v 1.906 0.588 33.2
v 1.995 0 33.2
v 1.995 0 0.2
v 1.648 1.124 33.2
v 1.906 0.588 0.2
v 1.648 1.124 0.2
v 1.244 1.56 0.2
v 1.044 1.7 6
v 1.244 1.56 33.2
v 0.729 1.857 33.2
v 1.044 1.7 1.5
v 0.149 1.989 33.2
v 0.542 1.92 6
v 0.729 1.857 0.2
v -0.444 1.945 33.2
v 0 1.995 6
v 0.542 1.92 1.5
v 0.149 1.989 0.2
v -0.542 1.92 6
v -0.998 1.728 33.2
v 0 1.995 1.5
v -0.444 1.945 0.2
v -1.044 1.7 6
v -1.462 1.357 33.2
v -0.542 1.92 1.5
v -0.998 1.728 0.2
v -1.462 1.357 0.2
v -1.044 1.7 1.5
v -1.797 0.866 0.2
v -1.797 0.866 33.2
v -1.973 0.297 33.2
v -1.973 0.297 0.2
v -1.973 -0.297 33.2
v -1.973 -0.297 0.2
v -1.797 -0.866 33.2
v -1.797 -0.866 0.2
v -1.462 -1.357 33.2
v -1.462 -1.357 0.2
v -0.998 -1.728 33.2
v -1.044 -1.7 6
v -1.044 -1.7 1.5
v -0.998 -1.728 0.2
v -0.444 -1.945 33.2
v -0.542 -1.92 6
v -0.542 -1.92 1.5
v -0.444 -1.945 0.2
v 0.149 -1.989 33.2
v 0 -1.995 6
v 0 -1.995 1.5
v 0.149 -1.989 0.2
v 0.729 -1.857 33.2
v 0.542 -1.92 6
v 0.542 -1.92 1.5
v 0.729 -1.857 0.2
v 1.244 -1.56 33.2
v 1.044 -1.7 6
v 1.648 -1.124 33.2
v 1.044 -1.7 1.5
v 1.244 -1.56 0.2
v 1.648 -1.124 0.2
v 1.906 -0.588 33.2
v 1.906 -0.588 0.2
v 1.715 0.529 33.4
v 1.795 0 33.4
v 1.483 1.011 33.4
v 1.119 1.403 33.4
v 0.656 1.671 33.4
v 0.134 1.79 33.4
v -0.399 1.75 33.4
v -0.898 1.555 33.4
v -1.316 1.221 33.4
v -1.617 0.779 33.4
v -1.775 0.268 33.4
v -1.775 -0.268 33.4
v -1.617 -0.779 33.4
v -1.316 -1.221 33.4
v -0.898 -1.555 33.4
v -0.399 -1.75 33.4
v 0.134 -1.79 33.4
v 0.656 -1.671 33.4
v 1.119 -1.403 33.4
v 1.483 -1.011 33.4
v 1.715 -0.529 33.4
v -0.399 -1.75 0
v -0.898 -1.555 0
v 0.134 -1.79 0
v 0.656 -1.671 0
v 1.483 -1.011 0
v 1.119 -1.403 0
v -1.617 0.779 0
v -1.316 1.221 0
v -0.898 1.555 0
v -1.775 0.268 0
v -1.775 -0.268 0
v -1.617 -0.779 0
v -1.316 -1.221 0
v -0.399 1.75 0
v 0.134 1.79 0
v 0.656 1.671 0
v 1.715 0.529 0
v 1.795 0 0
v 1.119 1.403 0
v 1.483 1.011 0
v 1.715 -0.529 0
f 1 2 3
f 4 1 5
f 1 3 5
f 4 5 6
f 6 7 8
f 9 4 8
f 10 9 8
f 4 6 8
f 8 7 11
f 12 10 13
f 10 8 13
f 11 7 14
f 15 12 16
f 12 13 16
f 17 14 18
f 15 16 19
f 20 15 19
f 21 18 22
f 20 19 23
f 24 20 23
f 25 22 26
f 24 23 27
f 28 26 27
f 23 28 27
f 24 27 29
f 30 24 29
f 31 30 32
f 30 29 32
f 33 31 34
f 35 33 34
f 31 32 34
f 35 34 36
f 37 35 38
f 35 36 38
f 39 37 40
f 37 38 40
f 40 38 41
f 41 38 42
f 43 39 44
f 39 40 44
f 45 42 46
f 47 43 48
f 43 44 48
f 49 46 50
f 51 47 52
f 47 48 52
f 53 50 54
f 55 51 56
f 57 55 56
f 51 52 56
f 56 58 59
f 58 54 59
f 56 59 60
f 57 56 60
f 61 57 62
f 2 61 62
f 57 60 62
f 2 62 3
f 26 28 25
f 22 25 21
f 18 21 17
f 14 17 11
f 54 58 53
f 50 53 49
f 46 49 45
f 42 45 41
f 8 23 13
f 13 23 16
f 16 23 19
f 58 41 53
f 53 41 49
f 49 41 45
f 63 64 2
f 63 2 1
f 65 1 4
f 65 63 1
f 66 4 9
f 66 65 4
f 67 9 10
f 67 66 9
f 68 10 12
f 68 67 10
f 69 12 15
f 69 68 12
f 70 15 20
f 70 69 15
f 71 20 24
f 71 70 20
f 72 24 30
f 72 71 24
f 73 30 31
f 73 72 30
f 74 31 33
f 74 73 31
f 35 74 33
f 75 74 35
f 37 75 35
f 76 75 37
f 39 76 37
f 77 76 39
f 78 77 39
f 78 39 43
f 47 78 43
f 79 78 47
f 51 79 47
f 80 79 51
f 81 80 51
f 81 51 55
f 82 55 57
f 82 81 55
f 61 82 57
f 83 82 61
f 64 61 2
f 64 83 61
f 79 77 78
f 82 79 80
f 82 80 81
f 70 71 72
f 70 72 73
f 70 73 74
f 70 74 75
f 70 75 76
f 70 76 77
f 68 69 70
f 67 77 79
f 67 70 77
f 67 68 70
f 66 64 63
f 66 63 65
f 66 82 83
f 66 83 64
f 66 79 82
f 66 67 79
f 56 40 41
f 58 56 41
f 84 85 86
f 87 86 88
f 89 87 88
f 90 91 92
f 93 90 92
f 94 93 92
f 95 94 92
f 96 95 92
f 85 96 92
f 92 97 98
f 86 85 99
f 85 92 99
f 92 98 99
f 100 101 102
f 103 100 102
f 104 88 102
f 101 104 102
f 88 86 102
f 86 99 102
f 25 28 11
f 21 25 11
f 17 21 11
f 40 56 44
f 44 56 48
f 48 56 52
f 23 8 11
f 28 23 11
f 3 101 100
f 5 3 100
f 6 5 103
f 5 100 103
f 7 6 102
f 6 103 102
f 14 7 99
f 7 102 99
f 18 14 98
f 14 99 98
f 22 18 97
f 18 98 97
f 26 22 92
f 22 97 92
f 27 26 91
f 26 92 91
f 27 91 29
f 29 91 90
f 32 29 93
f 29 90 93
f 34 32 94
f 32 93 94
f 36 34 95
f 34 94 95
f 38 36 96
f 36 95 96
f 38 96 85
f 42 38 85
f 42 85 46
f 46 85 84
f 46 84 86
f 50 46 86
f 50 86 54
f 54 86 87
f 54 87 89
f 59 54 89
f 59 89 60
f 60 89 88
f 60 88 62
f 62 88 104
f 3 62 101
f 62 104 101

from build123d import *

# Parameters (mm, degrees)
SKETCH1_R               = 1.995
BOSS_EXTRUDE1_DEPTH     = 33.4
SKETCH2_W               = 4.5
SKETCH2_H               = 0.920377874
CUT_EXTRUDE1_DEPTH      = 2.995
CUT_EXTRUDE1_DEPTH_BACK = 2.995
CHAMFER1_SIZE           = 0.2


with BuildPart() as part:
    # Sketch1 → Boss-Extrude1 (new body)
    with BuildSketch(Plane.XY):
        Circle(SKETCH1_R)
    extrude(amount=BOSS_EXTRUDE1_DEPTH)

    # Sketch2 → Cut-Extrude1 (cut, two sides)
    with BuildSketch(Plane(origin=(0, 0, 0), x_dir=(0, 0, -1), z_dir=(1, 0, 0))) as cut_extrude1_sk:
        with Locations((-3.75, 2.160188937)):
            Rectangle(SKETCH2_W, SKETCH2_H)
        with Locations((-3.75, -2.160188937)):
            Rectangle(SKETCH2_W, SKETCH2_H)
    extrude(amount=CUT_EXTRUDE1_DEPTH, mode=Mode.SUBTRACT)
    extrude(cut_extrude1_sk.sketch, amount=-CUT_EXTRUDE1_DEPTH_BACK, mode=Mode.SUBTRACT)

    # Chamfer1
    chamfer1_edges = [part.edges().sort_by_distance(p)[0] for p in [
        (-1.995, 0, 0),
        (-1.995, 0, 33.4),
    ]]
    chamfer(chamfer1_edges, length=CHAMFER1_SIZE)


solid = part.part
